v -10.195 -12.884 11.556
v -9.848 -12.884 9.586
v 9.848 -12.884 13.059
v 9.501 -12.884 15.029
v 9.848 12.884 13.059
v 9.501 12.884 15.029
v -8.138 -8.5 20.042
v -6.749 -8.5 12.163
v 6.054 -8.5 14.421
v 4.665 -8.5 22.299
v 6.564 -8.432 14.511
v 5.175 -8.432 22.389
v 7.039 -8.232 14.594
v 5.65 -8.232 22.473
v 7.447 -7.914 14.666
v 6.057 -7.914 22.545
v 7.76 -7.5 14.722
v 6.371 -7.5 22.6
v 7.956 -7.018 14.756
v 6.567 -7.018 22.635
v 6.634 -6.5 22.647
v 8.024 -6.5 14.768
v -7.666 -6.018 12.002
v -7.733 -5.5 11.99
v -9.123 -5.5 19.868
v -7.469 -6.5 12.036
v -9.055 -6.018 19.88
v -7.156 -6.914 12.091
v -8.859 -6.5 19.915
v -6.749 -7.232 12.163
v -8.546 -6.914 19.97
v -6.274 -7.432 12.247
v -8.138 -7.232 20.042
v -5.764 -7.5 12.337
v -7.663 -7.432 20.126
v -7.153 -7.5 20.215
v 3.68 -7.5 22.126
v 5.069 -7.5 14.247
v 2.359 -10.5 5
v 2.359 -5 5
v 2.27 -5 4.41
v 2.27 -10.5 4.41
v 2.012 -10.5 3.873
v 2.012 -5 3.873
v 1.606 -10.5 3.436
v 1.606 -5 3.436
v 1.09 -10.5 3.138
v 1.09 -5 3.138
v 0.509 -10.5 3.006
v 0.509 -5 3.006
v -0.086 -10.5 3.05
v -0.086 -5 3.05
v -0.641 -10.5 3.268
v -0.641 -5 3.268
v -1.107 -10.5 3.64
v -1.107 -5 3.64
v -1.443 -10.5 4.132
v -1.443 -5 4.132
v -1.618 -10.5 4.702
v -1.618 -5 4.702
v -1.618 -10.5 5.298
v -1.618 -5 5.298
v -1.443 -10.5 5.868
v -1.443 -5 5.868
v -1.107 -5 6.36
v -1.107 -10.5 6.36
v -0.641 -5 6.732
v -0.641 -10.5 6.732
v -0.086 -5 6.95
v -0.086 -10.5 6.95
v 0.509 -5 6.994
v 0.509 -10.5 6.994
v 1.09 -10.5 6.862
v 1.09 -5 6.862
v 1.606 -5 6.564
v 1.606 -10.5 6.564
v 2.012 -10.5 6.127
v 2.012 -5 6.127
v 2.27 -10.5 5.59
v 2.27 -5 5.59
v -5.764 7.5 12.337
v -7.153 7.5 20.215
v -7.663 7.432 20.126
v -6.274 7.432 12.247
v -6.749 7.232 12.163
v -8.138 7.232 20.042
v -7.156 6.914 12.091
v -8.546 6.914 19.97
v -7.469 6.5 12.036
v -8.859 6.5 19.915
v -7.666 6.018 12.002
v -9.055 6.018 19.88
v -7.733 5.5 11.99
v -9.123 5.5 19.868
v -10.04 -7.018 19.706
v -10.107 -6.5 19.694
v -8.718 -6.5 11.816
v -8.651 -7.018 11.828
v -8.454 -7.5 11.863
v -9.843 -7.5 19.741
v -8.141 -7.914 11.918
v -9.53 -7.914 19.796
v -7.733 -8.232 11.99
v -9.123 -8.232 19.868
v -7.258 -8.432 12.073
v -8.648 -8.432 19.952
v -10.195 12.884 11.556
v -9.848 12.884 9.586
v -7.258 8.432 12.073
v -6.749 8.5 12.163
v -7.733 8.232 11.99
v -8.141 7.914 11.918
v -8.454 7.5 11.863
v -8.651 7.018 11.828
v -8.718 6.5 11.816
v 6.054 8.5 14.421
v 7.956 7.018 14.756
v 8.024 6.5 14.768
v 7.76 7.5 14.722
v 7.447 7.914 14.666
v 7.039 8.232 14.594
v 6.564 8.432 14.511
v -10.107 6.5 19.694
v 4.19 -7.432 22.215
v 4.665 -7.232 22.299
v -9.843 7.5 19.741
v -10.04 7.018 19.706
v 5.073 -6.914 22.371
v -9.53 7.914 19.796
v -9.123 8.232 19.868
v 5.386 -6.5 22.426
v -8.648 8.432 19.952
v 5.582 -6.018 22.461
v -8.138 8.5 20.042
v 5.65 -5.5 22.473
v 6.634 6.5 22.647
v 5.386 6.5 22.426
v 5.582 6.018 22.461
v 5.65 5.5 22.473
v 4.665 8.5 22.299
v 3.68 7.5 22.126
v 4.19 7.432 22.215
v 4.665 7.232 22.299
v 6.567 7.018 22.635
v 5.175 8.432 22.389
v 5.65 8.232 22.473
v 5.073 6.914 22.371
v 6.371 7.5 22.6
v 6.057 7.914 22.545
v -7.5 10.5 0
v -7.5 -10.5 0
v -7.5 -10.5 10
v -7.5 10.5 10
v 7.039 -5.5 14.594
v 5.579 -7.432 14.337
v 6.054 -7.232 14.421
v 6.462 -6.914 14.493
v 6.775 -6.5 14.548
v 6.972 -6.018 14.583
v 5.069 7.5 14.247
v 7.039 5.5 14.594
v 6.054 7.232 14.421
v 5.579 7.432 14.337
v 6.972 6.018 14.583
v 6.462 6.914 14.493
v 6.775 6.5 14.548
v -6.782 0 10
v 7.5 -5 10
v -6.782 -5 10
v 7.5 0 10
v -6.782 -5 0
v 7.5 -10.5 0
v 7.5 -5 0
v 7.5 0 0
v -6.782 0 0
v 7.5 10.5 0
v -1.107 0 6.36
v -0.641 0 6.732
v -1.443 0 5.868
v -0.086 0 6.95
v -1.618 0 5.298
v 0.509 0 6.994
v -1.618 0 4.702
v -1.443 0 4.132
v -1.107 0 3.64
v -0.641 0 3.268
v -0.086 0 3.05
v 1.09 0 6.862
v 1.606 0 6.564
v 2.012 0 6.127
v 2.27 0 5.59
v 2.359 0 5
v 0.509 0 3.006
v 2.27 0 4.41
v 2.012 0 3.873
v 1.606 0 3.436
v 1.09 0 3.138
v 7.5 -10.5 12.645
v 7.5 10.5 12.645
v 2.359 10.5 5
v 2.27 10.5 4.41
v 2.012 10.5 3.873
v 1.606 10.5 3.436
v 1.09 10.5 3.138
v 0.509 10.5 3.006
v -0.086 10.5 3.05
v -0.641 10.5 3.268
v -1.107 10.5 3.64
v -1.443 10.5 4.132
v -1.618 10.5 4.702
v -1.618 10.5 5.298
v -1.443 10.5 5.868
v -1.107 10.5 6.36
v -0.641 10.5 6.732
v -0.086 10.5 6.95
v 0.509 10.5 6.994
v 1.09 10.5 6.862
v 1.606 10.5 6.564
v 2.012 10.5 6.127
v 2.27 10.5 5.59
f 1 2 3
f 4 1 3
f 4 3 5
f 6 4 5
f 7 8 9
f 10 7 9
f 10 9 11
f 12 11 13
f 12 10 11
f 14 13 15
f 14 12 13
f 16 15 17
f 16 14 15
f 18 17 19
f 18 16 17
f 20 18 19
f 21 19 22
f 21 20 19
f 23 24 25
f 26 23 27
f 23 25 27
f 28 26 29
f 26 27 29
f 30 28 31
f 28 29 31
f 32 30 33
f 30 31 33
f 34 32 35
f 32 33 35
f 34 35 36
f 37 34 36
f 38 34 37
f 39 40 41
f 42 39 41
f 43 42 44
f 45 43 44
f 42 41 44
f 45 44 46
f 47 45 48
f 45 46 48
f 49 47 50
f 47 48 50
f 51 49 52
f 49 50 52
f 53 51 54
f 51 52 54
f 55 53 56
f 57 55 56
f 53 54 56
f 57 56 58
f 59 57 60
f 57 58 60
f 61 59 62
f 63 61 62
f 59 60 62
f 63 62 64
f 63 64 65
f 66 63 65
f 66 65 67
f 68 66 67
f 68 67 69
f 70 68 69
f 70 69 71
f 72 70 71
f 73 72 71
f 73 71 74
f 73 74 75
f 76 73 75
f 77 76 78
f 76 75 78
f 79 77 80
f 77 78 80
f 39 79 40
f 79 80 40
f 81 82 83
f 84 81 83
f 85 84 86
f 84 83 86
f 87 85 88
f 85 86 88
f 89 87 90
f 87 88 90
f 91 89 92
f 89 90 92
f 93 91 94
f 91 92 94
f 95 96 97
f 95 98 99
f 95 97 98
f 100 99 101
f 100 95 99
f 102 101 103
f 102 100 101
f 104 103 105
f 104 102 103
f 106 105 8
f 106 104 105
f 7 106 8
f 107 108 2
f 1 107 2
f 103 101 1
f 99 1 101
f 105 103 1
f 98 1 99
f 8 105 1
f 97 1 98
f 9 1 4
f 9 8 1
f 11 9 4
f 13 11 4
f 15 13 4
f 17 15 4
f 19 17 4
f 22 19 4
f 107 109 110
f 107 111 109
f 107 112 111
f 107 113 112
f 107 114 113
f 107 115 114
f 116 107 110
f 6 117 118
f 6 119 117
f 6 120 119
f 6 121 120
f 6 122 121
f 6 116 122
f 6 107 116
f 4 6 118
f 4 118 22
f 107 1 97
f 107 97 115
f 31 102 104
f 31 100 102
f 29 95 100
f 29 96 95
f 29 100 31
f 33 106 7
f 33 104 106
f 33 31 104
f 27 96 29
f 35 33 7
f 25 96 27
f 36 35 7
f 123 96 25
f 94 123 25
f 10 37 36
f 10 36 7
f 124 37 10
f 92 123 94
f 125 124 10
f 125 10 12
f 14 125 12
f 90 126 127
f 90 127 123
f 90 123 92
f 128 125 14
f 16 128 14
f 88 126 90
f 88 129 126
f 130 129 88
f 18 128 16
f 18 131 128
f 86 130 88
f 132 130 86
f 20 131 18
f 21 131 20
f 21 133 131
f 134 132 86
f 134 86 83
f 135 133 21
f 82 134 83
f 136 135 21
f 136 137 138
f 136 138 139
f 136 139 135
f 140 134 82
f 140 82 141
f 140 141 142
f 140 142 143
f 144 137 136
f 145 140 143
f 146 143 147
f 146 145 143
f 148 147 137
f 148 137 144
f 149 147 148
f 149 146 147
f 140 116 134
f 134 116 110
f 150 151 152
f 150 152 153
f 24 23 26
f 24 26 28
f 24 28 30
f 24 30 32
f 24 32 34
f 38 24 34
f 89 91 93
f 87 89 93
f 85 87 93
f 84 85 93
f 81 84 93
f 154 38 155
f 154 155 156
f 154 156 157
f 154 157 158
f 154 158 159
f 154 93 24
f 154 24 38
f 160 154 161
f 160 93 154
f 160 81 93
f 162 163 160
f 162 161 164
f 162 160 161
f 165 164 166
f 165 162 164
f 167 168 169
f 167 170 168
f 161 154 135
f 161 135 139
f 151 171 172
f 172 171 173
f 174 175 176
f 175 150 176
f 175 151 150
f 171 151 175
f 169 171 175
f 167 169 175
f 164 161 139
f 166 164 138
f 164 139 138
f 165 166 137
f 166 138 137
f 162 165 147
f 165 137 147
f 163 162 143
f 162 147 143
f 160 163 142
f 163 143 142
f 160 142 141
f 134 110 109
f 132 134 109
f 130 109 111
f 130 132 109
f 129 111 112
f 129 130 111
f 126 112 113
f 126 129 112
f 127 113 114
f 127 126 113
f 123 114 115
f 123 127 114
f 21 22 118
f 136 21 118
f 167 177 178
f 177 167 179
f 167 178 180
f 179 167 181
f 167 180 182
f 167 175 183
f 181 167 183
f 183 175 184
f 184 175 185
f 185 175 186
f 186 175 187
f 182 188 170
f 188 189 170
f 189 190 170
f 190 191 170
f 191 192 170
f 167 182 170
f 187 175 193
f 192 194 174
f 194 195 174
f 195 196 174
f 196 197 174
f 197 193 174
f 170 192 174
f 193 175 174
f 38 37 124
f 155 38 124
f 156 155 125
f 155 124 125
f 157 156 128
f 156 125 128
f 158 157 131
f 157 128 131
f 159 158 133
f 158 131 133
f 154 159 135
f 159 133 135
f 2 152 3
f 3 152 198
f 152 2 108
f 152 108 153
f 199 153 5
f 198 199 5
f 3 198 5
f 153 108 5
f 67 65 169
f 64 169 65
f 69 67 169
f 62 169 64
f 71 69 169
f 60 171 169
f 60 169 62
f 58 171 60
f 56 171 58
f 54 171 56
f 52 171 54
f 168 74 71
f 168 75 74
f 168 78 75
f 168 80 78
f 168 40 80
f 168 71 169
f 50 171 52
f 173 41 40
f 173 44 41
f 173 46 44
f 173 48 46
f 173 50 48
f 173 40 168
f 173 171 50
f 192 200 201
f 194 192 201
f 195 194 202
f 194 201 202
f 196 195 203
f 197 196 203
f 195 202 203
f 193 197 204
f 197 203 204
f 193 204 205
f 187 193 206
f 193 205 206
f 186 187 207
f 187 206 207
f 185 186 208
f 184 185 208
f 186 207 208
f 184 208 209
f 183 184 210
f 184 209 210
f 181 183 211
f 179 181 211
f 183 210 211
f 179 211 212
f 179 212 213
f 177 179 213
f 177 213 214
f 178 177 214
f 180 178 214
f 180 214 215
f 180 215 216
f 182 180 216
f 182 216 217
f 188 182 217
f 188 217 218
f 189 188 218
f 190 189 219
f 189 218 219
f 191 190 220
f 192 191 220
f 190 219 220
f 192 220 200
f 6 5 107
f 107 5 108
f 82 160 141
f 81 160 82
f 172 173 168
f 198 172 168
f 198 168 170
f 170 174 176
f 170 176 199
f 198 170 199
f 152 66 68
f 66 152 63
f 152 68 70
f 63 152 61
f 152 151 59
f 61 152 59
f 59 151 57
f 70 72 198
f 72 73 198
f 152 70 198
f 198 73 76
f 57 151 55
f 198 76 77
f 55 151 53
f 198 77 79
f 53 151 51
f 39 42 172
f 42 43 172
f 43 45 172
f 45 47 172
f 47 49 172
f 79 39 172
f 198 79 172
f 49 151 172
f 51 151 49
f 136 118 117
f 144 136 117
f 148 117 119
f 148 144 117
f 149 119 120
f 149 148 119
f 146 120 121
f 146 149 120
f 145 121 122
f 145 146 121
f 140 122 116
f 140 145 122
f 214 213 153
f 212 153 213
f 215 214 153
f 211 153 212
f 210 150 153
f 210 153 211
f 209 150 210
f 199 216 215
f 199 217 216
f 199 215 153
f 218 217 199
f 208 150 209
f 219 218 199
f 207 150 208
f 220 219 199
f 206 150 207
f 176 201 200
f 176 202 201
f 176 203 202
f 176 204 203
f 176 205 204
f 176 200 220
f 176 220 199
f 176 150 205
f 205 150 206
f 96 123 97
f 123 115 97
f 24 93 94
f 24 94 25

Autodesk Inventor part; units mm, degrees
ref_plane "YZ Plane" through (0, 0, 0) normal (1, 0, 0) x (0, 1, 0)
ref_plane "XZ Plane" through (0, 0, 0) normal (0, 1, 0) x (-1, 0, 0)
ref_plane "XY Plane" through (0, 0, 0) normal (0, 0, 1) x (1, 0, 0)
sketch "Эскиз1" plane through (0, 0, 0) normal (0, 0, 1) x (1, 0, 0)
  line L0 (7.5, -5) -> (7.5, 0) projected
  line L1 (5.0577, -5) -> (7.5, -5) projected
  line L2 (5.0577, -5) -> (-4.3392, -5) projected
  line L3 (-6.7815, -5) -> (-4.3392, -5) projected
  line L4 (-6.7815, -5) -> (-6.7815, 0) projected
  line L5 (-6.7815, 0) -> (-4.3392, 0) projected
  line L6 (5.0577, 0) -> (-4.3392, 0) projected
  line L7 (5.0577, 0) -> (7.5, 0) projected
  line L8 (7.5, -10.5) -> (-7.5, -10.5) projected
  line L9 (7.5, 0) -> (-6.7815, 0) projected
  line L10 (7.5, 10.5) -> (7.5, 0) projected
  line L11 (-7.5, 10.5) -> (7.5, 10.5) projected
  line L12 (-7.5, -10.5) -> (-7.5, 10.5) projected
  line L13 (7.5, -10.5) -> (-7.5, -10.5) projected
  line L14 (7.5, -5) -> (7.5, -10.5) projected
  line L15 (7.5, -5) -> (-6.7815, -5) projected
  line L16 (-6.7815, -5) -> (-6.7815, 0) projected
  point P0 (0, 0)
extrude "Выдавливание1" add sketch "Эскиз1" along normal blind 10 contours L14 L8 L12 L11 L10 L7 L6 L5 L4 L3 L2 L1
sketch "Эскиз2" plane through (-7.5, 10.5, 0) normal (0, 1, 0) x (1, 0, 0)
  circle A0 centre (7.8593, -5) radius 2 projected
  point P0 (7.5, 0)
extrude "Выдавливание2" cut sketch "Эскиз2" against normal through all
sketch "Эскиз3" plane through (-7.5, 10.5, 0) normal (0, 1, 0) x (1, 0, 0)
  line L0 (15, -10) -> (0, -10) projected
  line L1 (15, -10) -> (15, -12.6449)
  line L2 (15, -12.6449) -> (0, -10)
  point P0 (7.5, 0)
  dimension "d5" = 10
extrude "Выдавливание3" add sketch "Эскиз3" against normal up to surface (21 mm away)
sketch "Эскиз4" plane through (7.5, -10.5, 12.6449) normal (-0.1736, 0, 0.9848) x (0.9848, 0, 0.1736)
  line L0 (-15.2314, 0) -> (0, 0) projected
  line L1 (0, 21) -> (0, 0) projected
  line L2 (-15.2314, 21) -> (0, 21) projected
  line L3 (-15.2314, 21) -> (-15.2314, 0) projected
  line L4 (-17.6157, -2.3843) -> (2.3843, -2.3843)
  line L5 (2.3843, -2.3843) -> (2.3843, 23.3843)
  line L6 (2.3843, 23.3843) -> (-17.6157, 23.3843)
  line L7 (-17.6157, 23.3843) -> (-17.6157, -2.3843)
  point P0 (-9.5818, 10.5)
  dimension "d8" = 20
extrude "Выдавливание4" add sketch "Эскиз4" along normal blind 2 contours L3 L2 L1 L0 | L7 L6 L5 L4
sketch "Эскиз5" plane through (7.1527, -10.5, 14.6145) normal (-0.1736, 0, 0.9848) x (0.9848, 0, 0.1736)
  line L0 (0.8843, 19) -> (-16.1157, 19)
  line L1 (-16.1157, 19) -> (-16.1157, 2)
  line L2 (-16.1157, 2) -> (0.8843, 2)
  line L3 (0.8843, 2) -> (0.8843, 19)
  line L4 (2.3843, -2.3843) -> (2.3843, 23.3843) projected
  line L5 (-17.6157, -2.3843) -> (2.3843, -2.3843) projected
  line L6 (-0.1157, 18) -> (-15.1157, 18)
  line L7 (-15.1157, 18) -> (-15.1157, 3)
  line L8 (-15.1157, 3) -> (-0.1157, 3)
  line L9 (-0.1157, 3) -> (-0.1157, 18)
  point P0 (-9.5818, 10.5)
  point P1 (0.8843, 10.5)
  point P2 (2.3843, 10.5)
  point P3 (-7.6157, 2)
  point P4 (-7.6157, -2.3843)
  dimension "d11" = 17
  dimension "d12" = 1
extrude "Выдавливание5" add sketch "Эскиз5" along normal blind 8
fillet "Сопряжение1" radius 2 8 edges at (7.329, -8.5, 18.7073) (7.329, 8.5, 18.7073) (-9.4128, 8.5, 15.7553) (-9.4128, -8.5, 15.7553) (-8.4279, 7.5, 15.9289) (6.3442, 7.5, 18.5337) (-8.4279, -7.5, 15.9289) (6.3442, -7.5, 18.5337)
equation "\"degg\" = 80deg"
properties part number "base_80"
